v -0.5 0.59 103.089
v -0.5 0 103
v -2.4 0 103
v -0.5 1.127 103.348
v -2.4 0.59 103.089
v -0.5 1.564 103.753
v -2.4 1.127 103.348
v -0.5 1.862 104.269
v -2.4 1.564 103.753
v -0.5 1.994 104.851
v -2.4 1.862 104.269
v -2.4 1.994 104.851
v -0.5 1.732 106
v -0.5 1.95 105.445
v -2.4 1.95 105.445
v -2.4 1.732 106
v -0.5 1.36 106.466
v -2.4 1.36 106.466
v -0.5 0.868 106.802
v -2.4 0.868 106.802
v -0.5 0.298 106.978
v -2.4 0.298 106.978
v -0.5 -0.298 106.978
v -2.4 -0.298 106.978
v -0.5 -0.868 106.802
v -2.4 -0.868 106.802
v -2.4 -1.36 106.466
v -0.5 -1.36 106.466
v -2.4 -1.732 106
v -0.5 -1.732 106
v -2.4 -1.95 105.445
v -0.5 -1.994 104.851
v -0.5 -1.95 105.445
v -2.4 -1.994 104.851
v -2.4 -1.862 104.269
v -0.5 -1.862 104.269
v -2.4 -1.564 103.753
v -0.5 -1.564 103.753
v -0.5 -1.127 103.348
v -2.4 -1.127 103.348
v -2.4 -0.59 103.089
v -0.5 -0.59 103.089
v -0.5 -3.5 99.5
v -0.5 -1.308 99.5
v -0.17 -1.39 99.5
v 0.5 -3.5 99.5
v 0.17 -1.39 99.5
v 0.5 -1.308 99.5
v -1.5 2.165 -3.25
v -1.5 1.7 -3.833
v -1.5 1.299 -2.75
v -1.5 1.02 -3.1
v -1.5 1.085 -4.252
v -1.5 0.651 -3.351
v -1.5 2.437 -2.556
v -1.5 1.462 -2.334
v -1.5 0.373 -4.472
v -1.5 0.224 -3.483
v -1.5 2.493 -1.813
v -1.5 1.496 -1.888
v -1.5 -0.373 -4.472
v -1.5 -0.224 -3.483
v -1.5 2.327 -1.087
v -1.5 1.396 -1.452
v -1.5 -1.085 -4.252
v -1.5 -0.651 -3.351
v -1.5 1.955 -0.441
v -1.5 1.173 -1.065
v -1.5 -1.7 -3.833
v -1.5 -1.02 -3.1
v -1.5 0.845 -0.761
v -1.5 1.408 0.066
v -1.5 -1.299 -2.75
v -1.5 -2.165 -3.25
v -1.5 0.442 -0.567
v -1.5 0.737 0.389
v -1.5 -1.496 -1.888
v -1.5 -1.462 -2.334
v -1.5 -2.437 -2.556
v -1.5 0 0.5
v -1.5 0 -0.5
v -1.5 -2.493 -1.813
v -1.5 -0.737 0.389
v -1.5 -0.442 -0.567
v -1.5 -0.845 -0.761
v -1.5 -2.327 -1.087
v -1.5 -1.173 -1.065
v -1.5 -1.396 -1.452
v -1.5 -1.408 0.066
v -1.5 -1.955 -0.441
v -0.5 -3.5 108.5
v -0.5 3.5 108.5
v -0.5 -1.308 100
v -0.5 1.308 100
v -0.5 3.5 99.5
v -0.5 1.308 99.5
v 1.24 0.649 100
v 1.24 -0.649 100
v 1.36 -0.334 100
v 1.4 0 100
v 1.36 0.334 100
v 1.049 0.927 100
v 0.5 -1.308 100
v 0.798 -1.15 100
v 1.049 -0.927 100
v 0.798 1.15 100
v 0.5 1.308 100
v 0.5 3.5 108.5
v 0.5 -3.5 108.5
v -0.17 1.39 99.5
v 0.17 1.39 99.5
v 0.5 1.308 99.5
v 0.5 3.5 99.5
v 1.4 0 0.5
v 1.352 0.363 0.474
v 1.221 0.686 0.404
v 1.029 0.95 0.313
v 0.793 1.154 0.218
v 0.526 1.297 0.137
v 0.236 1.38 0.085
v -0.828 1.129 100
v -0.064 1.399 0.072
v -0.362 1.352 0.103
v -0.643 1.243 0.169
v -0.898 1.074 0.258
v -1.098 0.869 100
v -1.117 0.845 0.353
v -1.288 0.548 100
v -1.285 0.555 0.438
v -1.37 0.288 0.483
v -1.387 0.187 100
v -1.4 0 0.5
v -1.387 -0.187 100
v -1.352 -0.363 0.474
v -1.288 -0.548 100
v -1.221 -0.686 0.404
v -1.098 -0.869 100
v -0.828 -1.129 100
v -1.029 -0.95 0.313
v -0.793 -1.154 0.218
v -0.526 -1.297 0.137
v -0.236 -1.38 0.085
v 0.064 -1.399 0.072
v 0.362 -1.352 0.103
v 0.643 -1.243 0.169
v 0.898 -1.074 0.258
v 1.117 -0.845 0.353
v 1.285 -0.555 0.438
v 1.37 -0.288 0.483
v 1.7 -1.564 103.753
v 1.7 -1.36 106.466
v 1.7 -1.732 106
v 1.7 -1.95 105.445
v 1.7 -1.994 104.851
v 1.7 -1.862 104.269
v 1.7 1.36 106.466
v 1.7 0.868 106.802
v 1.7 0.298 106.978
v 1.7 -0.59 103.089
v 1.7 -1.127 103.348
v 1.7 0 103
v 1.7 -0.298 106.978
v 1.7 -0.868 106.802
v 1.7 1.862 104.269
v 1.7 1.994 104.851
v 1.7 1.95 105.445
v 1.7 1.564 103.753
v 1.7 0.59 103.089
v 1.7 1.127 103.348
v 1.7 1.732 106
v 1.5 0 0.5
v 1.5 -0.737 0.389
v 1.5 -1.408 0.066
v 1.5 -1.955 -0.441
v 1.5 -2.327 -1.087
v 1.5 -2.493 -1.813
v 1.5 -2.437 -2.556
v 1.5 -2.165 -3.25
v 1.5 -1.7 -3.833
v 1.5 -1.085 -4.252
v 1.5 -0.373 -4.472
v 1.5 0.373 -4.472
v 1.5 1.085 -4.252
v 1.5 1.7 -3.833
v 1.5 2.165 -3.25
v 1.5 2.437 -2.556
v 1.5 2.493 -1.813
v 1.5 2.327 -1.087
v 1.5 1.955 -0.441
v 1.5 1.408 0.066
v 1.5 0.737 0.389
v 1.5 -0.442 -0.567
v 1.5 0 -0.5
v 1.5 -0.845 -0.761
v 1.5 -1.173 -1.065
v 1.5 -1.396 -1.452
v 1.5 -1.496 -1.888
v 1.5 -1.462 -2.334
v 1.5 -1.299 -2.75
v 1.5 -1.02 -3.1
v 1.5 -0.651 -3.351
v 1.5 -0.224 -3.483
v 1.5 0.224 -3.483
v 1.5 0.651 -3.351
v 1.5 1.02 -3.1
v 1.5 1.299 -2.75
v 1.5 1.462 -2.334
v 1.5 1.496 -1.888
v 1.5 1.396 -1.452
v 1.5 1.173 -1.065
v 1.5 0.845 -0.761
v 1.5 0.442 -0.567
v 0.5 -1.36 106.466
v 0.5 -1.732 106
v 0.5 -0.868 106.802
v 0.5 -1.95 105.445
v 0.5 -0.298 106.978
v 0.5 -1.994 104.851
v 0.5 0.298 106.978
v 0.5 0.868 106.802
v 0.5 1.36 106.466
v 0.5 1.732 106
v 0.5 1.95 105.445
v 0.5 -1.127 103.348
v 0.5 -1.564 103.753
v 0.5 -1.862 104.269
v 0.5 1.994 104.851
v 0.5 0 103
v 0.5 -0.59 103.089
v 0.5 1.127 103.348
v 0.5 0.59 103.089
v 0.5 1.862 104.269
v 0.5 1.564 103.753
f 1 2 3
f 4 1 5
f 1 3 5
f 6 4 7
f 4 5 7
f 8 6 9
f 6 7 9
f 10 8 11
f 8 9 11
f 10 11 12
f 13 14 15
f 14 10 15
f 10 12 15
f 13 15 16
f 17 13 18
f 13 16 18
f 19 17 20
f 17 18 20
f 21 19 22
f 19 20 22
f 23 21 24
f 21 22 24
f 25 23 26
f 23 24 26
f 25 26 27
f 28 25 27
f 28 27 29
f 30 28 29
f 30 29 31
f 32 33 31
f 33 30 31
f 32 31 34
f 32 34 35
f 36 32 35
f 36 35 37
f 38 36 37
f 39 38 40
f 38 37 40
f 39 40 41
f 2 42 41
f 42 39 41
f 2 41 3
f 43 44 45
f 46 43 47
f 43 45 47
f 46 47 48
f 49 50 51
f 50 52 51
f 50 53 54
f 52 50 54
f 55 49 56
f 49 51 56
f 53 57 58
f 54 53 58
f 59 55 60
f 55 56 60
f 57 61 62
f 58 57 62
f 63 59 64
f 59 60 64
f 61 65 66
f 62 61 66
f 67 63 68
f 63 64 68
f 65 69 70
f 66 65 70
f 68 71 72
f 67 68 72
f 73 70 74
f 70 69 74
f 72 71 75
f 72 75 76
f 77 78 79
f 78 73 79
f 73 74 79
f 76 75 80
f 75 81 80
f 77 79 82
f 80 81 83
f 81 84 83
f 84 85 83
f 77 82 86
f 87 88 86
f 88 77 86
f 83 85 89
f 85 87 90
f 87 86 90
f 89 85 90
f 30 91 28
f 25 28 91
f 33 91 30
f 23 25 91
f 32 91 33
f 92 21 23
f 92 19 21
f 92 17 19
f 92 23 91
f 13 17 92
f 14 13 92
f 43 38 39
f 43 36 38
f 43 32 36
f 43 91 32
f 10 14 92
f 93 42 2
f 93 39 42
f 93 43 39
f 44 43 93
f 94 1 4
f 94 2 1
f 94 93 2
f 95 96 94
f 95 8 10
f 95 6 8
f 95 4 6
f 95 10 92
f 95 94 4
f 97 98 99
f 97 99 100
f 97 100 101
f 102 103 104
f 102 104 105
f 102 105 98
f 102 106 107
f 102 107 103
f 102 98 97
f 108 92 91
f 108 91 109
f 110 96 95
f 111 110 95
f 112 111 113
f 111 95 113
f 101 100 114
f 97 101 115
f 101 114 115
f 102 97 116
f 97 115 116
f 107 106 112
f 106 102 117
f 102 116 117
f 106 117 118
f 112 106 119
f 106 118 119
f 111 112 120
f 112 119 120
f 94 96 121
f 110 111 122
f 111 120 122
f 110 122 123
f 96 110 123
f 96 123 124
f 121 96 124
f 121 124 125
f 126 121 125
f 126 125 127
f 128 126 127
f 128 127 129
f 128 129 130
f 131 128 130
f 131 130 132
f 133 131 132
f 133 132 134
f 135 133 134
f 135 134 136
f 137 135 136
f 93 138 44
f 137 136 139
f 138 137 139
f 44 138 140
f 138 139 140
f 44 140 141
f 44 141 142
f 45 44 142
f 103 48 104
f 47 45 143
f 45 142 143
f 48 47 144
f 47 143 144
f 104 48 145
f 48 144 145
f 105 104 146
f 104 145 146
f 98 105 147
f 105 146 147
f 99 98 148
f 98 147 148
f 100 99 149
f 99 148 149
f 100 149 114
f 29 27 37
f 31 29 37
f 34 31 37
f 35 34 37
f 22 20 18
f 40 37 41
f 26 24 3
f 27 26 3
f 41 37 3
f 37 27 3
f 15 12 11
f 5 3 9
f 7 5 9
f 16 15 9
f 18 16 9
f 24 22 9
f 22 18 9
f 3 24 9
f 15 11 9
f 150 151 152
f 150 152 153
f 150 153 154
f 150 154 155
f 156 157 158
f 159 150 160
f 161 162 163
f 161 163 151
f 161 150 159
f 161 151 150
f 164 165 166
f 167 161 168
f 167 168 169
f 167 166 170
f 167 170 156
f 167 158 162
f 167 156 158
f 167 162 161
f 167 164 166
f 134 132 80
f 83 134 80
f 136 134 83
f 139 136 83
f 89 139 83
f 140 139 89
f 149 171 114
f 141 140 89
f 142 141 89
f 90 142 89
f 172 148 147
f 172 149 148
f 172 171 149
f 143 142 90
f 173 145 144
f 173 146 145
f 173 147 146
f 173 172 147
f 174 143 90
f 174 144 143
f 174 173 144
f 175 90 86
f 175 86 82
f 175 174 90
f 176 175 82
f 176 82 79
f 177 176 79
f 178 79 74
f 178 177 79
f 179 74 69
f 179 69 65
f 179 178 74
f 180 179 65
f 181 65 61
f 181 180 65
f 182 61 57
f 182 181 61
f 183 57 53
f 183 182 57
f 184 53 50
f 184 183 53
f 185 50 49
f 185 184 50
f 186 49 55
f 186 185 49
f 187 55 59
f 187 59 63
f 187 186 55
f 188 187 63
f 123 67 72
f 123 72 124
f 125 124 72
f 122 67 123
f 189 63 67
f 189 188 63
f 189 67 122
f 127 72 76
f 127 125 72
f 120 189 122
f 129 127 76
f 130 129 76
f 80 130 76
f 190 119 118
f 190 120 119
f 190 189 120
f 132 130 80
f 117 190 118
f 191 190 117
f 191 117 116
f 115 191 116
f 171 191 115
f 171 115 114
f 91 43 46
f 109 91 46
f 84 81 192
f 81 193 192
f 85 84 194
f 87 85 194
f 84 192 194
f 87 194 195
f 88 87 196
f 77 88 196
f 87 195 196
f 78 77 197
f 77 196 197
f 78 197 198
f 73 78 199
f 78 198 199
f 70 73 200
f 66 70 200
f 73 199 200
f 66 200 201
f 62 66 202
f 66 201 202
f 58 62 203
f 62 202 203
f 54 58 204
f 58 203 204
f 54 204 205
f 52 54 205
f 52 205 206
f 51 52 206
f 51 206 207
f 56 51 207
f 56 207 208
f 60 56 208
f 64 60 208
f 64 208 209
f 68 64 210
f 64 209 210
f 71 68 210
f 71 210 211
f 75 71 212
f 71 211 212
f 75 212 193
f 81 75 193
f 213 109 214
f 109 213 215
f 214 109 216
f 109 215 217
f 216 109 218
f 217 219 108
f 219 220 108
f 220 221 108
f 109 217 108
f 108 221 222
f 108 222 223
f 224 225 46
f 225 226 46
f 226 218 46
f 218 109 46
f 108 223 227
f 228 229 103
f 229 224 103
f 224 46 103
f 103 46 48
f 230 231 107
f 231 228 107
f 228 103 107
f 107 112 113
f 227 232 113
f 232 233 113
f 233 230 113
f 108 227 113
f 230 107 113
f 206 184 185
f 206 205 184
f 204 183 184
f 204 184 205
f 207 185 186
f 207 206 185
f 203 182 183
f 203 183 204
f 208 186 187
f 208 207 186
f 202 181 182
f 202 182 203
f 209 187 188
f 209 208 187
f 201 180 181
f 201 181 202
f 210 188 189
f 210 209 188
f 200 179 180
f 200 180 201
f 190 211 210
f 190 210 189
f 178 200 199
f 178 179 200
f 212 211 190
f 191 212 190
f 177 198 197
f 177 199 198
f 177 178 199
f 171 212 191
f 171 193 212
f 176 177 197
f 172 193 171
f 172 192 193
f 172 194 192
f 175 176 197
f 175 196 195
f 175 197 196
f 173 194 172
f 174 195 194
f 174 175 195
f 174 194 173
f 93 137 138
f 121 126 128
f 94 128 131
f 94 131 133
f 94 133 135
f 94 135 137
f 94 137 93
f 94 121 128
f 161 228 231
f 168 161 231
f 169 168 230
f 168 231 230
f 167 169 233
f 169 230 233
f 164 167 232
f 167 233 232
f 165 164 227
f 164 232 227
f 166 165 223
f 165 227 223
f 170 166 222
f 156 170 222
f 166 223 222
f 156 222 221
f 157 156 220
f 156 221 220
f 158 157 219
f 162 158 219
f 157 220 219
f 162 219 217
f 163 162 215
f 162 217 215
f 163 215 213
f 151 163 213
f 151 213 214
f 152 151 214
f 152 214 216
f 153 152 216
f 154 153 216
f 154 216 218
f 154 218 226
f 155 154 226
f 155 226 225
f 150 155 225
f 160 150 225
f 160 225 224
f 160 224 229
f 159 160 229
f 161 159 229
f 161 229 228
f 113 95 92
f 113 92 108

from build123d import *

# Parameters (mm, degrees)
SKETCH1_R                = 1.4
BOSS_EXTRUDE1_DEPTH      = 100
SKETCH2_W                = 3
SKETCH2_H                = 1
SKETCH3_W                = 1
SKETCH3_H                = 7
BOSS_EXTRUDE2_DEPTH      = 9
BOSS_EXTRUDE3_DEPTH      = 1.7
BOSS_EXTRUDE3_DEPTH_BACK = 2.4
SKETCH4_R                = 2


with BuildPart() as part:
    # Sketch1 → Boss-Extrude1 (new body)
    with BuildSketch(Plane.XY):
        Circle(SKETCH1_R)
    extrude(amount=BOSS_EXTRUDE1_DEPTH)

    # Sketch2 → Revolve1 (revolve)
    with BuildSketch(Plane(origin=(0, 0, 0), x_dir=(1, 0, 0), z_dir=(0, 1, 0))):
        Rectangle(SKETCH2_W, SKETCH2_H)
    revolve(axis=Axis((-2.442552493, 0, -2), (1, 0, 0)))

    # Sketch3 → Boss-Extrude2 (add)
    with BuildSketch(Plane.XY.offset(99.5)):
        Rectangle(SKETCH3_W, SKETCH3_H)
    extrude(amount=BOSS_EXTRUDE2_DEPTH)

    # Sketch4 → Boss-Extrude3 (add, two sides: drawn at the far end of the back side and taken through both)
    with BuildSketch(Plane(origin=(0, 0, 0), x_dir=(0, 0, -1), z_dir=(1, 0, 0)).offset(-BOSS_EXTRUDE3_DEPTH_BACK)):
        with Locations((-105, 0)):
            Circle(SKETCH4_R)
    extrude(amount=BOSS_EXTRUDE3_DEPTH + BOSS_EXTRUDE3_DEPTH_BACK)


solid = part.part
